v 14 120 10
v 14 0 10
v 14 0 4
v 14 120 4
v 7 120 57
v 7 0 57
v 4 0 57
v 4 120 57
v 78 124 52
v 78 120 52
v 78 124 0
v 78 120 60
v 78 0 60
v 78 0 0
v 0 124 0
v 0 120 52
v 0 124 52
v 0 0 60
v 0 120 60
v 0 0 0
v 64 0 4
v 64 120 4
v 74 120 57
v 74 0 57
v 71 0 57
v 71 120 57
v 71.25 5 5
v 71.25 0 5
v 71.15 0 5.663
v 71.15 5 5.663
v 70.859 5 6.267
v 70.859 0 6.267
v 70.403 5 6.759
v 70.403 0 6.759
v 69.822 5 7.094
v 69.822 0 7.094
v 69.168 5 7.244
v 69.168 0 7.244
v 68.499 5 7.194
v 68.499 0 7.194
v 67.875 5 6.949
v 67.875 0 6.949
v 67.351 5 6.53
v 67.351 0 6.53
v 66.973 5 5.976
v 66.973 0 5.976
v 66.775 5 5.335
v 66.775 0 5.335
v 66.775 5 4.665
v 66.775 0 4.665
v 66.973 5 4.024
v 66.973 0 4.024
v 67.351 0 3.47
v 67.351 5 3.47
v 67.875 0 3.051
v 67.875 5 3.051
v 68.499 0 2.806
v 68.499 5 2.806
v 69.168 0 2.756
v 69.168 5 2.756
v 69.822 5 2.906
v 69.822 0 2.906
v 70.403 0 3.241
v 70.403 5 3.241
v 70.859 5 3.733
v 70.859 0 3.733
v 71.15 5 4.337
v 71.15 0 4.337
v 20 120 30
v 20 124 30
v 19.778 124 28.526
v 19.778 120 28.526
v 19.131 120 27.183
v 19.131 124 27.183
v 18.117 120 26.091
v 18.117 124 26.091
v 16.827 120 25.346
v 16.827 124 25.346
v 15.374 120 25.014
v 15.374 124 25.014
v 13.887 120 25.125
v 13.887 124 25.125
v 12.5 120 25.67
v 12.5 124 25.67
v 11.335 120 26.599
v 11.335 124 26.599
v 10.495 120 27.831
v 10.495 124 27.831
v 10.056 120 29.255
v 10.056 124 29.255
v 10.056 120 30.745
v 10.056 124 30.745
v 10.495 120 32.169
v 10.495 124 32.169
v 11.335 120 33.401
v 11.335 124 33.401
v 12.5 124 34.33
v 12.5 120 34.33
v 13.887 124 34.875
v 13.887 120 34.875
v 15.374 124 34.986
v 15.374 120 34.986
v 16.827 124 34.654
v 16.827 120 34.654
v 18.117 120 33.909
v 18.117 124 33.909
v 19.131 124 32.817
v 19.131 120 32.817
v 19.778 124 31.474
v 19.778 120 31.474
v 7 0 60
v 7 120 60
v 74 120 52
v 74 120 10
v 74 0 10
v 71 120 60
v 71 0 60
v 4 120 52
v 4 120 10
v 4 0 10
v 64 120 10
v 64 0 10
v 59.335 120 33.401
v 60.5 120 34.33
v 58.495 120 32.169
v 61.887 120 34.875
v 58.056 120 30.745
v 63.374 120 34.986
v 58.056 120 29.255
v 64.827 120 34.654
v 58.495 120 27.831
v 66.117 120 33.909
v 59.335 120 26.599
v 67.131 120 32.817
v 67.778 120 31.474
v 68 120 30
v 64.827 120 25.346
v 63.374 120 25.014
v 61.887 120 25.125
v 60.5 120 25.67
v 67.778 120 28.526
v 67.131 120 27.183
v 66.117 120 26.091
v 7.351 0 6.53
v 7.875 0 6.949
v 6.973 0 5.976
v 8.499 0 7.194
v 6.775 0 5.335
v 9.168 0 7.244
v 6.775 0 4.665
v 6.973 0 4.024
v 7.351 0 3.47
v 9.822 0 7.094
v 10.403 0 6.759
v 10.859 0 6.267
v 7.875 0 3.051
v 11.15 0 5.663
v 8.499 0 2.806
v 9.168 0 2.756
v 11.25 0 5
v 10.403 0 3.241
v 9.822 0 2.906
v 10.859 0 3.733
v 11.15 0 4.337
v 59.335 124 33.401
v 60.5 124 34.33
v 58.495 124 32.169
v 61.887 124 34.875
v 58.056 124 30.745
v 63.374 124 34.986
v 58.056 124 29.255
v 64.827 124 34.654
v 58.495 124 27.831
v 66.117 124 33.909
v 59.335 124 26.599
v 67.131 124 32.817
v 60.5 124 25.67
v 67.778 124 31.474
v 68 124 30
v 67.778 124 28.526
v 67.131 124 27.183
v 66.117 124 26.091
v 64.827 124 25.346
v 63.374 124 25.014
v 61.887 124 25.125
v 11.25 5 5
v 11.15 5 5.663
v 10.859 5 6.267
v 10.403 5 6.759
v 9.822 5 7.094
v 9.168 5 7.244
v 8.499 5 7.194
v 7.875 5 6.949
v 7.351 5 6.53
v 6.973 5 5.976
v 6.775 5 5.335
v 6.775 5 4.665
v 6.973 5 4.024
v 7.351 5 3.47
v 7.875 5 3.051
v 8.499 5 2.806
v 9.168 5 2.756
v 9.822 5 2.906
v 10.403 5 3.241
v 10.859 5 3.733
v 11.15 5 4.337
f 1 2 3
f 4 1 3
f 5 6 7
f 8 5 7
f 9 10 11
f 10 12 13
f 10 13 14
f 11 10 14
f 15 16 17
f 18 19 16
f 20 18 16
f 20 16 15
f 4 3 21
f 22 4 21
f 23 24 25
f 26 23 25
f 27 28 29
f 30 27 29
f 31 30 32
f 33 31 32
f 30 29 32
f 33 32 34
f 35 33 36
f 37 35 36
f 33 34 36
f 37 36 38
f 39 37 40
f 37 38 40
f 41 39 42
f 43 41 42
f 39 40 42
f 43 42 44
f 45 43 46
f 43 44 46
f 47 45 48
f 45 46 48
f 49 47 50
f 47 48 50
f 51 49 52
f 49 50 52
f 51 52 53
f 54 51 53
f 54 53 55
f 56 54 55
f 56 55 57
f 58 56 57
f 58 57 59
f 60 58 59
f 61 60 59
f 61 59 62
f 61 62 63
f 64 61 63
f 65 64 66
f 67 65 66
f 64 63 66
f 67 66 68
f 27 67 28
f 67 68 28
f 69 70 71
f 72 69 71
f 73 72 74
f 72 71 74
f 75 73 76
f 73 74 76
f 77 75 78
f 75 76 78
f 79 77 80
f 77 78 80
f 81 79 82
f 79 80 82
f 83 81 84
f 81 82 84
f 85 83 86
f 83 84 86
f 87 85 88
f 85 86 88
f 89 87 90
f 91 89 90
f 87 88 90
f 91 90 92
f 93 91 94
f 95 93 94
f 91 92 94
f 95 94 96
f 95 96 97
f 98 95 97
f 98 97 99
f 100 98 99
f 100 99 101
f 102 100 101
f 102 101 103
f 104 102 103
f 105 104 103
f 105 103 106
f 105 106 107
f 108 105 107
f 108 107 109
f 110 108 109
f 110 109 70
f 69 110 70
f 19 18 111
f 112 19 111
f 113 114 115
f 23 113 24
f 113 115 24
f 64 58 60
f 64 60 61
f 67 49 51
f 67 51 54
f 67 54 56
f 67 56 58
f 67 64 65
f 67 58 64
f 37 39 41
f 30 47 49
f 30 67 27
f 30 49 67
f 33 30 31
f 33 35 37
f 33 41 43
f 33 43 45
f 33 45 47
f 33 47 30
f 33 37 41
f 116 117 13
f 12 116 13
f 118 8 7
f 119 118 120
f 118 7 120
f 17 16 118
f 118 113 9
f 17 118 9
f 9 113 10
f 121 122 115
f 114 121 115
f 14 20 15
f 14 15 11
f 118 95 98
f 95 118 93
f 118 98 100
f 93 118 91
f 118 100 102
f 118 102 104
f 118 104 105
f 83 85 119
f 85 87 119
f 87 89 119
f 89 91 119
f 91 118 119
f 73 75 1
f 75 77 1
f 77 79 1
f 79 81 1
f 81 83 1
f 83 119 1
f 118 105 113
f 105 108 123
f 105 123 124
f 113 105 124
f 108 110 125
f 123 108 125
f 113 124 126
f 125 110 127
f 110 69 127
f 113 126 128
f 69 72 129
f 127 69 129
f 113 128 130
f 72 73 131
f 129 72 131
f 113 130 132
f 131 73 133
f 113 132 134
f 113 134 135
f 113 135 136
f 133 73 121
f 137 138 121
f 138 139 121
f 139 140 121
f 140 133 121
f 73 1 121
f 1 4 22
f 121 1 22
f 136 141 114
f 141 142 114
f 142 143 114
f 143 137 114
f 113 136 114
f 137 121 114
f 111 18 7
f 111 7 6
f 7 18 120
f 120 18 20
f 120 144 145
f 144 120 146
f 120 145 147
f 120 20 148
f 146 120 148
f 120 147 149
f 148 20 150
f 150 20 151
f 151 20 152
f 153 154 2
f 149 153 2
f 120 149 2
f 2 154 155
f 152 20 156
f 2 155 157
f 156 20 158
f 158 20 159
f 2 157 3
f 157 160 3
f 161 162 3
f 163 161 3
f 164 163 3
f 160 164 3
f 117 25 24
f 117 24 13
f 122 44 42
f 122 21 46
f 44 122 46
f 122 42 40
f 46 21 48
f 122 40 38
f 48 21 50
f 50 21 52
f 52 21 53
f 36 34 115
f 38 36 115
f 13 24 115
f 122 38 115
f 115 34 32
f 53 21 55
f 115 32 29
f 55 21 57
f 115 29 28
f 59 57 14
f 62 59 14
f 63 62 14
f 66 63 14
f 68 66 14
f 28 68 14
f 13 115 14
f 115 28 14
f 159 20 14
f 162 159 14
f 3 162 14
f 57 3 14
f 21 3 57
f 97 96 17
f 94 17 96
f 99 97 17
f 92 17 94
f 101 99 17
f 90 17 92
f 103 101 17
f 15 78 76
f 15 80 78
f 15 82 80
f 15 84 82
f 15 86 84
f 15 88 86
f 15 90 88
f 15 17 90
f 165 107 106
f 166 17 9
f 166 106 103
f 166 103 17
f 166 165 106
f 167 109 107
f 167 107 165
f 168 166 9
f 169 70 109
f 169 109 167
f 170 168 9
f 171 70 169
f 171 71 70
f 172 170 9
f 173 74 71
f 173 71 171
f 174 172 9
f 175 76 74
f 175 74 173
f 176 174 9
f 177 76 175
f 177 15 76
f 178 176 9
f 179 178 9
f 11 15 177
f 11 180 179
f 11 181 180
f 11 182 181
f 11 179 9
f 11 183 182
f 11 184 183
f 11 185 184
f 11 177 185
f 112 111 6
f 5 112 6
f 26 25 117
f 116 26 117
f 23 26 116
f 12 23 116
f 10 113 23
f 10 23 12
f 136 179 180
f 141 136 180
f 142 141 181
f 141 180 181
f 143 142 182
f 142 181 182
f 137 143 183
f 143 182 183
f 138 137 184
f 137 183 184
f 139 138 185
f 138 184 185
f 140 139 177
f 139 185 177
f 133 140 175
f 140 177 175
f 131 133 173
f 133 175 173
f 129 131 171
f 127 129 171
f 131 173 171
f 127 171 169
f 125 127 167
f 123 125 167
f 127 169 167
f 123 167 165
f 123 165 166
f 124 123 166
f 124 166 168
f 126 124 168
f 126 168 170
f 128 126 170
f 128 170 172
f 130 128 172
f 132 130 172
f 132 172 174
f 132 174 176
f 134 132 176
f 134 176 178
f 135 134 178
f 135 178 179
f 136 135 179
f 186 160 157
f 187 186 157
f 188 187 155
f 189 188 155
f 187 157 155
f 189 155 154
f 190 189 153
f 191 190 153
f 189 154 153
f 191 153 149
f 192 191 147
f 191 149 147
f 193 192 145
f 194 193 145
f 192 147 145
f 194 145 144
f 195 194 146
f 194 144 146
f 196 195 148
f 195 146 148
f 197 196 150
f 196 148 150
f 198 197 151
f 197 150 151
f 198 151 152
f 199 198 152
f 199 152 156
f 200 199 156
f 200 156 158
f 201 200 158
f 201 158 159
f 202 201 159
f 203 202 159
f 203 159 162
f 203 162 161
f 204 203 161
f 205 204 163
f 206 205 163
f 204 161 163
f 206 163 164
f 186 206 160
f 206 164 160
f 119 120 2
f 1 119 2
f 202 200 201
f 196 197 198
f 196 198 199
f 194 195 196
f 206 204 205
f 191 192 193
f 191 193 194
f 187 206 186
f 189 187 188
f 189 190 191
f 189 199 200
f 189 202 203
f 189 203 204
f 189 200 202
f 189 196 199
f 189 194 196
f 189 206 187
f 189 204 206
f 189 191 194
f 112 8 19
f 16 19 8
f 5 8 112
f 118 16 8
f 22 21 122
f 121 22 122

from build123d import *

# Parameters (mm, degrees)
BOSS_EXTRU_2_DEPTH      = 120
ESQUISSE2_R             = 2.25
ENL_V_MAT_EXTRU_1_DEPTH = 5
ESQUISSE4_W             = 78
ESQUISSE4_H             = 52
BOSS_EXTRU_3_DEPTH      = 4
ESQUISSE6_R             = 5
ENL_V_MAT_EXTRU_3_DEPTH = 10


with BuildPart() as part:
    # Esquisse1 → Boss.-Extru.2 (new body)
    with BuildSketch(Plane(origin=(0, 0, 0), x_dir=(1, 0, 0), z_dir=(0, 1, 0))):
        Polygon((71, -60), (78, -60), (78, 0), (0, 0), (0, -60), (7, -60), (7, -57), (4, -57), (4, -10), (14, -10), (14, -4), (64, -4), (64, -10), (74, -10), (74, -57), (71, -57), align=None)
    extrude(amount=BOSS_EXTRU_2_DEPTH)

    # Esquisse2 → Enlèv. mat.-Extru.1 (cut)
    with BuildSketch(Plane.XZ):
        with Locations((69, 5)):
            Circle(ESQUISSE2_R)
        with Locations((9, 5)):
            Circle(ESQUISSE2_R)
    extrude(amount=-ENL_V_MAT_EXTRU_1_DEPTH, mode=Mode.SUBTRACT)

    # Esquisse4 → Boss.-Extru.3 (add)
    with BuildSketch(Plane(origin=(0, 120, 0), x_dir=(1, 0, 0), z_dir=(0, 1, 0))):
        with Locations((39, -26)):
            Rectangle(ESQUISSE4_W, ESQUISSE4_H)
    extrude(amount=BOSS_EXTRU_3_DEPTH)

    # Esquisse6 → Enlèv. mat.-Extru.3 (cut)
    with BuildSketch(Plane(origin=(0, 124, 0), x_dir=(1, 0, 0), z_dir=(0, 1, 0))):
        with Locations((15, -30)):
            Circle(ESQUISSE6_R)
        with Locations((63, -30)):
            Circle(ESQUISSE6_R)
    extrude(amount=-ENL_V_MAT_EXTRU_3_DEPTH, mode=Mode.SUBTRACT)


solid = part.part
